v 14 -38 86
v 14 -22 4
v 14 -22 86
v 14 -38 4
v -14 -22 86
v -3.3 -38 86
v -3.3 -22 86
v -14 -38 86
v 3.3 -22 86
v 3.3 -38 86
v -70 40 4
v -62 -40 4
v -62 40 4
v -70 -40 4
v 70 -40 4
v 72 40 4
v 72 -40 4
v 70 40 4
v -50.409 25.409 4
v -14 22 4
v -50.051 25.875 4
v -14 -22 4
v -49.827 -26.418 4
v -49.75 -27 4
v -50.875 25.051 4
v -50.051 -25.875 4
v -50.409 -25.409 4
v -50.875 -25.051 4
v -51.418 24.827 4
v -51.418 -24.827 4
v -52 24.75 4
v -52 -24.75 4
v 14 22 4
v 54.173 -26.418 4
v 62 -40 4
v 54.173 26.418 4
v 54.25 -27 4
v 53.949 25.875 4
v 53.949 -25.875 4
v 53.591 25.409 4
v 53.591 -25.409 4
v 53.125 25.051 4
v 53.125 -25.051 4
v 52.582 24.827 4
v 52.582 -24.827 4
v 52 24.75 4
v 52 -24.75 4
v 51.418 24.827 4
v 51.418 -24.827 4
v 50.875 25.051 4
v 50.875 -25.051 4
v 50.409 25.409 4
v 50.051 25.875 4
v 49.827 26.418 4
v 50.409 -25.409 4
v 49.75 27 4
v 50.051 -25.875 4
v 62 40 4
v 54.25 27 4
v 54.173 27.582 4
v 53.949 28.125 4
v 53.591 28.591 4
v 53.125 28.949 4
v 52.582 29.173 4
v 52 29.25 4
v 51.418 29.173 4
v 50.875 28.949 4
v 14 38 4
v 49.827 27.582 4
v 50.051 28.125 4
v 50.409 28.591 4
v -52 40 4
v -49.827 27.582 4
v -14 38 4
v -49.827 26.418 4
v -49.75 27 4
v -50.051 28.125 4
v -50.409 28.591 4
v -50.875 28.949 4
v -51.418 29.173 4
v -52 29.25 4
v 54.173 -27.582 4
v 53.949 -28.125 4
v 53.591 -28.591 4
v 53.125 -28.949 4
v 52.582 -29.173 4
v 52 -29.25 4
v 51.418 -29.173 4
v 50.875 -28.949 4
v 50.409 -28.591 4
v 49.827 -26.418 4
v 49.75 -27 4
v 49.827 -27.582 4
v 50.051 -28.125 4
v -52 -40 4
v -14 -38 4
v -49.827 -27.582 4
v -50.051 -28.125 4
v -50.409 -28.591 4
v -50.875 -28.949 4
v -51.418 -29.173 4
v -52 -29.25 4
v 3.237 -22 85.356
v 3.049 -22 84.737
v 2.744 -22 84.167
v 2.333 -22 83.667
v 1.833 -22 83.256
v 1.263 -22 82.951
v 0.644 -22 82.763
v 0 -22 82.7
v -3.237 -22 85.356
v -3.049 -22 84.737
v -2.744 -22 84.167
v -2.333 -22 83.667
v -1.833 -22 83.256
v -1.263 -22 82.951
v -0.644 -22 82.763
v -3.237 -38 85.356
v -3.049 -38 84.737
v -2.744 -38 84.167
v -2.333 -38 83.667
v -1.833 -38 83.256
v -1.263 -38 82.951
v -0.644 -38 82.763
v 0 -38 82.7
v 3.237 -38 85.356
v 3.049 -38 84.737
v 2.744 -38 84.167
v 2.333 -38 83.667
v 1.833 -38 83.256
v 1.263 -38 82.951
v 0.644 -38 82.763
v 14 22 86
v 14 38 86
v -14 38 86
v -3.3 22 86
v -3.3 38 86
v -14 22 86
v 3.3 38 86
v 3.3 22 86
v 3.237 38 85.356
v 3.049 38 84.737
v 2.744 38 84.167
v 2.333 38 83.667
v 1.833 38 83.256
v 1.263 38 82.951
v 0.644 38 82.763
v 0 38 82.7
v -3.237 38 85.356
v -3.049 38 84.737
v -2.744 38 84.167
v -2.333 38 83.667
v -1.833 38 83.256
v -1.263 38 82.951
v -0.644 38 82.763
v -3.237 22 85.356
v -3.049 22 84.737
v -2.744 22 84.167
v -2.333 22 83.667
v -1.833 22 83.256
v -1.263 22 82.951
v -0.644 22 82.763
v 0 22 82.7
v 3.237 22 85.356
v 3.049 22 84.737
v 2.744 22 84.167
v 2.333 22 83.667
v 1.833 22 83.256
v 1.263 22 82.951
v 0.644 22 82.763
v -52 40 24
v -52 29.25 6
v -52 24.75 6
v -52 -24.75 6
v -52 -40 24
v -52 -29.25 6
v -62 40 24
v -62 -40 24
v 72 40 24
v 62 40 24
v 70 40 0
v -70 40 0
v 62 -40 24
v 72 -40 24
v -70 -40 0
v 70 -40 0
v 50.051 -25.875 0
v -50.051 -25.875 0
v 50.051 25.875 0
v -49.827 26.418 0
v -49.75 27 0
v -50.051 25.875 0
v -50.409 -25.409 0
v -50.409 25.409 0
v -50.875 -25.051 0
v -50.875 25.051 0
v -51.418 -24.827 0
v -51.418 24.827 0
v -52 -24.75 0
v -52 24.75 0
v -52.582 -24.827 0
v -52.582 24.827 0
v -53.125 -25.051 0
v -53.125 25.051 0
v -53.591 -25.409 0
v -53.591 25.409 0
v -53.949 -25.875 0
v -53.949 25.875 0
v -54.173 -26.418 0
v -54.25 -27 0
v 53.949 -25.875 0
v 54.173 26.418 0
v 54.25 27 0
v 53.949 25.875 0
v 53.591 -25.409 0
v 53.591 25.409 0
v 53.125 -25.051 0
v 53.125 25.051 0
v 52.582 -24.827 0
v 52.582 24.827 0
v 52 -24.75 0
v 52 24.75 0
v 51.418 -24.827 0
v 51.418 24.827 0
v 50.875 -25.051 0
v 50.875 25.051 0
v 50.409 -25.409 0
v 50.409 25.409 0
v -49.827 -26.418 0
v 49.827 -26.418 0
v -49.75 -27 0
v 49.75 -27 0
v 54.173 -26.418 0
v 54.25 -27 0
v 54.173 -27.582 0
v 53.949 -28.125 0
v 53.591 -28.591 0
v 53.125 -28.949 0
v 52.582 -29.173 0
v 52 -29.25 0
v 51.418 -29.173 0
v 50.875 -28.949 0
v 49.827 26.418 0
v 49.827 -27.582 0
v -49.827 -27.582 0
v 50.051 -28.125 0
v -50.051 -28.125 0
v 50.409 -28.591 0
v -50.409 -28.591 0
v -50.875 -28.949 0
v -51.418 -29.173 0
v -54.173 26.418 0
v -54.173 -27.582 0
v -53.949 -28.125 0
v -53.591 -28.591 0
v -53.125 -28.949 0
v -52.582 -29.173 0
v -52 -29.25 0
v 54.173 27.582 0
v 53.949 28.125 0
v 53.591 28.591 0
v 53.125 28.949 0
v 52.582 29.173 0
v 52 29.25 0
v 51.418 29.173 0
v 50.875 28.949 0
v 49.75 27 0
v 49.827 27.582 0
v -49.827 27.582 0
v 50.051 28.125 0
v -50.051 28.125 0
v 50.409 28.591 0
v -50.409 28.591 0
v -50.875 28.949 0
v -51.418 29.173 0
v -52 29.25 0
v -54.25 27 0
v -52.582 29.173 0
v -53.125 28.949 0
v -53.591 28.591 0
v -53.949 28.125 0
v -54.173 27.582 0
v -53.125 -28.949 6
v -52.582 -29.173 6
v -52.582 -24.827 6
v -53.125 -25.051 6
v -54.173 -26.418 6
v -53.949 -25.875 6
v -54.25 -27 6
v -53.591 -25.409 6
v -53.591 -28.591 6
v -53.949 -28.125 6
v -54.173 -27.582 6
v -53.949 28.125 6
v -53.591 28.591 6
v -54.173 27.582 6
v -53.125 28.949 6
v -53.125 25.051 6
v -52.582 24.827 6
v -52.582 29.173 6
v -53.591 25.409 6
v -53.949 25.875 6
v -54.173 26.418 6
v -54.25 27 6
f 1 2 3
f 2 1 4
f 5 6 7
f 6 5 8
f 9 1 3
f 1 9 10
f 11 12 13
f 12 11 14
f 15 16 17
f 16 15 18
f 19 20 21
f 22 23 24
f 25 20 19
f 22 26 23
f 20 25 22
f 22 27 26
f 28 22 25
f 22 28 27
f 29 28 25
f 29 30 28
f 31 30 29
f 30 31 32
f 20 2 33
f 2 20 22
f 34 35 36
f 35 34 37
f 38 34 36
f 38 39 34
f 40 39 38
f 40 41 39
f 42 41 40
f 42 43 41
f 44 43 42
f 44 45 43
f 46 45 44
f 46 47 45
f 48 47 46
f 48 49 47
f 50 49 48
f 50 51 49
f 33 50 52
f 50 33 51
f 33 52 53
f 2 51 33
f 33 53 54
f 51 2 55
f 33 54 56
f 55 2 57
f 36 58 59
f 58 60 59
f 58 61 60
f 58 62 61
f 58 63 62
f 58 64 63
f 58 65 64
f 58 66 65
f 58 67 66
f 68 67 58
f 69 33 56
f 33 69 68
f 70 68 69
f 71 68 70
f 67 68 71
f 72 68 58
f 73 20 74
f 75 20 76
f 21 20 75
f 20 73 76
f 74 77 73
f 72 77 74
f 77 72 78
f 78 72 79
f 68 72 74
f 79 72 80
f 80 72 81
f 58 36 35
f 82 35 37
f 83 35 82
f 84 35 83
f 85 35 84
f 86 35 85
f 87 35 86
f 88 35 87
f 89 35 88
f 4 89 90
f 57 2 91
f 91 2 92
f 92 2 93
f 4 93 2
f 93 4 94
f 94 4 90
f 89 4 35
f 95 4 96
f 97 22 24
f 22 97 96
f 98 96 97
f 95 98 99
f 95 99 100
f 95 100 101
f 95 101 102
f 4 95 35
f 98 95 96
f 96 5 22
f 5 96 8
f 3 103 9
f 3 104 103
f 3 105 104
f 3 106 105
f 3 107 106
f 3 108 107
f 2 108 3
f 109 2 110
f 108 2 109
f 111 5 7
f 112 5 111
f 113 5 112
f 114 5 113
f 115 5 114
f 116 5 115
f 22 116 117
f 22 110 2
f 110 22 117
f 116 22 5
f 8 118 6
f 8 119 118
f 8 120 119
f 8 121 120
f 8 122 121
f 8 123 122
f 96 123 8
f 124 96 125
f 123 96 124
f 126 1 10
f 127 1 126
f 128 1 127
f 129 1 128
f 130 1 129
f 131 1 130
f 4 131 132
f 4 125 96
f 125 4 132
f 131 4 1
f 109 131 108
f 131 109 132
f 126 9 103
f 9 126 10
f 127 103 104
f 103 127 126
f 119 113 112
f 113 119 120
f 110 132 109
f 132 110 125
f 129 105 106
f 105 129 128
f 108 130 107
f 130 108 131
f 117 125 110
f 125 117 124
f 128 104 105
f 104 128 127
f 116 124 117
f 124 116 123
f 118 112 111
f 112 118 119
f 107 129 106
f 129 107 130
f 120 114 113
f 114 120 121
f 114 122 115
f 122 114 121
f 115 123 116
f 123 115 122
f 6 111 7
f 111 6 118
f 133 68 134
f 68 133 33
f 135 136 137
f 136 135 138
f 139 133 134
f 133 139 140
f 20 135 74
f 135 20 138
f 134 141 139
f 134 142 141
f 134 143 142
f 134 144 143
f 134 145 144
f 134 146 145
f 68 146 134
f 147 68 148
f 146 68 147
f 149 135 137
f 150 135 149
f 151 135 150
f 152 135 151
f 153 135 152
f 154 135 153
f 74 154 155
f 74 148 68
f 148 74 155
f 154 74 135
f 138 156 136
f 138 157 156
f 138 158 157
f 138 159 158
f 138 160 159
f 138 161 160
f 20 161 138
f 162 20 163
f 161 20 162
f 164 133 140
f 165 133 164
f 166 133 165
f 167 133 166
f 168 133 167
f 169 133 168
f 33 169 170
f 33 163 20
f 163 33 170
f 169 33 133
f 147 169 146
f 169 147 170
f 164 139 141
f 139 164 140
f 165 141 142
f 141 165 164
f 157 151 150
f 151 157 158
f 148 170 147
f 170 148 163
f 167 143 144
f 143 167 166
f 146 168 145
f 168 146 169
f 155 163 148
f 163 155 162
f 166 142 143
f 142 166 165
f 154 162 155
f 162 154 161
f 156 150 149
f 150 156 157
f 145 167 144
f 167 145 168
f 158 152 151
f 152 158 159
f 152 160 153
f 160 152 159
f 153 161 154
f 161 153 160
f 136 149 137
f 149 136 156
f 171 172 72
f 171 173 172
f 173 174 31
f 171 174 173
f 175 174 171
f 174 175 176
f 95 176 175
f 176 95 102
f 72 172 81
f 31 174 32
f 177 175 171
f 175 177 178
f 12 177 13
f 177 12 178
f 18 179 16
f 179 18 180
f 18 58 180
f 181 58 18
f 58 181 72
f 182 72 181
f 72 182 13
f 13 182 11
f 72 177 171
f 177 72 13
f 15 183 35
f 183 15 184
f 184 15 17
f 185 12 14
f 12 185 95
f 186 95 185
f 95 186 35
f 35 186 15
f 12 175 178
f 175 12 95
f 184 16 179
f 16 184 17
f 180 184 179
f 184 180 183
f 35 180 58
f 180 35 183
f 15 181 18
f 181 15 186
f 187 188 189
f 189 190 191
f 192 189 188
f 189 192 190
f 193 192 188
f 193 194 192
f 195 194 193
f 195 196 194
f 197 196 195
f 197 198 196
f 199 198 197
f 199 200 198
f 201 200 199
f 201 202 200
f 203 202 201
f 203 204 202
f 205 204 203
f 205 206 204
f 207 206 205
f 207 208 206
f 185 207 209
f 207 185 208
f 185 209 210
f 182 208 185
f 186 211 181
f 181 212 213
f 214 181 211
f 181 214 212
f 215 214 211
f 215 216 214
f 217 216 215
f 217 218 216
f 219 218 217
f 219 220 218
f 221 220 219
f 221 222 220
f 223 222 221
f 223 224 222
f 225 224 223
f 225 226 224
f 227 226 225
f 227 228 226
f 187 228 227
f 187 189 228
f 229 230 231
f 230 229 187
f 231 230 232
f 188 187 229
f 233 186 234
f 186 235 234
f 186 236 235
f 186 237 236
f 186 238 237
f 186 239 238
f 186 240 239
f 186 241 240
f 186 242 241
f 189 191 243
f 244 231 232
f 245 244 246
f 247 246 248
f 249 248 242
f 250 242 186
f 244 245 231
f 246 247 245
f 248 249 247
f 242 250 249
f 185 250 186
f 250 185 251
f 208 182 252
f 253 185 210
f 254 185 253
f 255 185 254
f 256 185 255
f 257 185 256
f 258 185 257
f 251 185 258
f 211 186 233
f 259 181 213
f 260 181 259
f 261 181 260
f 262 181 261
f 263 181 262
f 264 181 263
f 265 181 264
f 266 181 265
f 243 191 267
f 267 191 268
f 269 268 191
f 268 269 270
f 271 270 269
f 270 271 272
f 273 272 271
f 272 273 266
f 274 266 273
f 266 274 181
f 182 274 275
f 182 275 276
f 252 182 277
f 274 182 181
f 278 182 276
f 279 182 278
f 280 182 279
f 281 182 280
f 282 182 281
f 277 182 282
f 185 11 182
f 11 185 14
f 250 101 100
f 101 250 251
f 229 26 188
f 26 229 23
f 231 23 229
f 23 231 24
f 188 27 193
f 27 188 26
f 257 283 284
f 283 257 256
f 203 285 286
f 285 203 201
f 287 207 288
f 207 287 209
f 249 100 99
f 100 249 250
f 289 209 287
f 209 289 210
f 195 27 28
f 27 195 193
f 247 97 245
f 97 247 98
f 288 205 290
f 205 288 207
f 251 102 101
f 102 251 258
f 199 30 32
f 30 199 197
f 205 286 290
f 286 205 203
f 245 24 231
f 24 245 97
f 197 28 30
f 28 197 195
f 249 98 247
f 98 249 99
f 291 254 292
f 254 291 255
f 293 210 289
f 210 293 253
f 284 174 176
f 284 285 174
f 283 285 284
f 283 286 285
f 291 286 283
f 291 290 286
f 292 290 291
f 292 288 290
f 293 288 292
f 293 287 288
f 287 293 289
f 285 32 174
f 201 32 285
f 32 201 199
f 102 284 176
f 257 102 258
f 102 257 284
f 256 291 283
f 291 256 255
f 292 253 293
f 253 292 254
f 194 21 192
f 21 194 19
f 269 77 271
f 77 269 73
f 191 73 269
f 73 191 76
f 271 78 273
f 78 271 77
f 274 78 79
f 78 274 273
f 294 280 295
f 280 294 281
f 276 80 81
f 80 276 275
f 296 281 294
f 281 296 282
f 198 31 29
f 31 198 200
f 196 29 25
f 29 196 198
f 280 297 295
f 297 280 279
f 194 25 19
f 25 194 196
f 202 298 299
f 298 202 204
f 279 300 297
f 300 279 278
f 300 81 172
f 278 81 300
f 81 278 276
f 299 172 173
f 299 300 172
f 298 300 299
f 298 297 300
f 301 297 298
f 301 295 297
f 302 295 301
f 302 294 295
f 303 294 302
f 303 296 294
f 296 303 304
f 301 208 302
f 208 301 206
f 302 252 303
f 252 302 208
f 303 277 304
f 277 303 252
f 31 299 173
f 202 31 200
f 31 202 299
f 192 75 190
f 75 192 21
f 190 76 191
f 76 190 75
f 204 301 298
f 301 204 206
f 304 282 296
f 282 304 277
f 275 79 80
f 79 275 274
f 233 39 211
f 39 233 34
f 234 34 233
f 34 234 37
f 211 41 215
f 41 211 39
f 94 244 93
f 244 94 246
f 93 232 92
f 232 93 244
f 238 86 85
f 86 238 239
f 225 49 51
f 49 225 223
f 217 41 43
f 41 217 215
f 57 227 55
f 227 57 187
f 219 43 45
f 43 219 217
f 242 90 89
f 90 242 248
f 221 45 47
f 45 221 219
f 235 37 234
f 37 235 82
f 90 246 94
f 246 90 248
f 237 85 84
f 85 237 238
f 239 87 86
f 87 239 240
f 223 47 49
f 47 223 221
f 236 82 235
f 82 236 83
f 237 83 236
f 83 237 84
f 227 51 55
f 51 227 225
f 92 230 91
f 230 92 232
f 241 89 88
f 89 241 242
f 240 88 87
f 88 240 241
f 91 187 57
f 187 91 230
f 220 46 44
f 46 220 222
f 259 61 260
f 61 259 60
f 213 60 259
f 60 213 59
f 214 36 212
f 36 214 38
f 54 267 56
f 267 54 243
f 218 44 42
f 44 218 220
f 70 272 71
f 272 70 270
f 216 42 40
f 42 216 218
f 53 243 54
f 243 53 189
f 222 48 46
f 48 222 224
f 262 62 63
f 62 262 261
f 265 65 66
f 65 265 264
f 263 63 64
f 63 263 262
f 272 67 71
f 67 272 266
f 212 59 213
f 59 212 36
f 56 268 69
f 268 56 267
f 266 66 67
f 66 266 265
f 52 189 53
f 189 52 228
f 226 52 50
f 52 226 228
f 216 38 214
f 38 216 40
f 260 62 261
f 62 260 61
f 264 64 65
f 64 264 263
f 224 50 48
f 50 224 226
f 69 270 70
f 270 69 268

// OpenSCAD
base_length=140; base_depth=80; pivot_height=82; axle_bore=6.6; mount_hole_diameter=4.5;
module saddle(y){ difference(){ translate([-14,y-8,4]) cube([28,16,pivot_height]); translate([0,y,pivot_height+4]) rotate([90,0,0]) cylinder(d=axle_bore,h=20,center=true,$fn=32); translate([-axle_bore/2,y-11,pivot_height+4]) cube([axle_bore,22,15]); }}
module seesaw_base(){ difference(){ union(){ translate([-base_length/2,-base_depth/2,0]) cube([base_length,base_depth,4]); saddle(-30); saddle(30); for(x=[-62,62]) translate([x,-base_depth/2,4]) cube([10,base_depth,20]); } for(x=[-52,52],y=[-27,27]) translate([x,y,-1]) cylinder(d=mount_hole_diameter,h=7,$fn=24); }}
assert(axle_bore==6.6 && pivot_height==82); echo("SCADCTL_REQUIREMENT:parameters:PASS"); seesaw_base();
